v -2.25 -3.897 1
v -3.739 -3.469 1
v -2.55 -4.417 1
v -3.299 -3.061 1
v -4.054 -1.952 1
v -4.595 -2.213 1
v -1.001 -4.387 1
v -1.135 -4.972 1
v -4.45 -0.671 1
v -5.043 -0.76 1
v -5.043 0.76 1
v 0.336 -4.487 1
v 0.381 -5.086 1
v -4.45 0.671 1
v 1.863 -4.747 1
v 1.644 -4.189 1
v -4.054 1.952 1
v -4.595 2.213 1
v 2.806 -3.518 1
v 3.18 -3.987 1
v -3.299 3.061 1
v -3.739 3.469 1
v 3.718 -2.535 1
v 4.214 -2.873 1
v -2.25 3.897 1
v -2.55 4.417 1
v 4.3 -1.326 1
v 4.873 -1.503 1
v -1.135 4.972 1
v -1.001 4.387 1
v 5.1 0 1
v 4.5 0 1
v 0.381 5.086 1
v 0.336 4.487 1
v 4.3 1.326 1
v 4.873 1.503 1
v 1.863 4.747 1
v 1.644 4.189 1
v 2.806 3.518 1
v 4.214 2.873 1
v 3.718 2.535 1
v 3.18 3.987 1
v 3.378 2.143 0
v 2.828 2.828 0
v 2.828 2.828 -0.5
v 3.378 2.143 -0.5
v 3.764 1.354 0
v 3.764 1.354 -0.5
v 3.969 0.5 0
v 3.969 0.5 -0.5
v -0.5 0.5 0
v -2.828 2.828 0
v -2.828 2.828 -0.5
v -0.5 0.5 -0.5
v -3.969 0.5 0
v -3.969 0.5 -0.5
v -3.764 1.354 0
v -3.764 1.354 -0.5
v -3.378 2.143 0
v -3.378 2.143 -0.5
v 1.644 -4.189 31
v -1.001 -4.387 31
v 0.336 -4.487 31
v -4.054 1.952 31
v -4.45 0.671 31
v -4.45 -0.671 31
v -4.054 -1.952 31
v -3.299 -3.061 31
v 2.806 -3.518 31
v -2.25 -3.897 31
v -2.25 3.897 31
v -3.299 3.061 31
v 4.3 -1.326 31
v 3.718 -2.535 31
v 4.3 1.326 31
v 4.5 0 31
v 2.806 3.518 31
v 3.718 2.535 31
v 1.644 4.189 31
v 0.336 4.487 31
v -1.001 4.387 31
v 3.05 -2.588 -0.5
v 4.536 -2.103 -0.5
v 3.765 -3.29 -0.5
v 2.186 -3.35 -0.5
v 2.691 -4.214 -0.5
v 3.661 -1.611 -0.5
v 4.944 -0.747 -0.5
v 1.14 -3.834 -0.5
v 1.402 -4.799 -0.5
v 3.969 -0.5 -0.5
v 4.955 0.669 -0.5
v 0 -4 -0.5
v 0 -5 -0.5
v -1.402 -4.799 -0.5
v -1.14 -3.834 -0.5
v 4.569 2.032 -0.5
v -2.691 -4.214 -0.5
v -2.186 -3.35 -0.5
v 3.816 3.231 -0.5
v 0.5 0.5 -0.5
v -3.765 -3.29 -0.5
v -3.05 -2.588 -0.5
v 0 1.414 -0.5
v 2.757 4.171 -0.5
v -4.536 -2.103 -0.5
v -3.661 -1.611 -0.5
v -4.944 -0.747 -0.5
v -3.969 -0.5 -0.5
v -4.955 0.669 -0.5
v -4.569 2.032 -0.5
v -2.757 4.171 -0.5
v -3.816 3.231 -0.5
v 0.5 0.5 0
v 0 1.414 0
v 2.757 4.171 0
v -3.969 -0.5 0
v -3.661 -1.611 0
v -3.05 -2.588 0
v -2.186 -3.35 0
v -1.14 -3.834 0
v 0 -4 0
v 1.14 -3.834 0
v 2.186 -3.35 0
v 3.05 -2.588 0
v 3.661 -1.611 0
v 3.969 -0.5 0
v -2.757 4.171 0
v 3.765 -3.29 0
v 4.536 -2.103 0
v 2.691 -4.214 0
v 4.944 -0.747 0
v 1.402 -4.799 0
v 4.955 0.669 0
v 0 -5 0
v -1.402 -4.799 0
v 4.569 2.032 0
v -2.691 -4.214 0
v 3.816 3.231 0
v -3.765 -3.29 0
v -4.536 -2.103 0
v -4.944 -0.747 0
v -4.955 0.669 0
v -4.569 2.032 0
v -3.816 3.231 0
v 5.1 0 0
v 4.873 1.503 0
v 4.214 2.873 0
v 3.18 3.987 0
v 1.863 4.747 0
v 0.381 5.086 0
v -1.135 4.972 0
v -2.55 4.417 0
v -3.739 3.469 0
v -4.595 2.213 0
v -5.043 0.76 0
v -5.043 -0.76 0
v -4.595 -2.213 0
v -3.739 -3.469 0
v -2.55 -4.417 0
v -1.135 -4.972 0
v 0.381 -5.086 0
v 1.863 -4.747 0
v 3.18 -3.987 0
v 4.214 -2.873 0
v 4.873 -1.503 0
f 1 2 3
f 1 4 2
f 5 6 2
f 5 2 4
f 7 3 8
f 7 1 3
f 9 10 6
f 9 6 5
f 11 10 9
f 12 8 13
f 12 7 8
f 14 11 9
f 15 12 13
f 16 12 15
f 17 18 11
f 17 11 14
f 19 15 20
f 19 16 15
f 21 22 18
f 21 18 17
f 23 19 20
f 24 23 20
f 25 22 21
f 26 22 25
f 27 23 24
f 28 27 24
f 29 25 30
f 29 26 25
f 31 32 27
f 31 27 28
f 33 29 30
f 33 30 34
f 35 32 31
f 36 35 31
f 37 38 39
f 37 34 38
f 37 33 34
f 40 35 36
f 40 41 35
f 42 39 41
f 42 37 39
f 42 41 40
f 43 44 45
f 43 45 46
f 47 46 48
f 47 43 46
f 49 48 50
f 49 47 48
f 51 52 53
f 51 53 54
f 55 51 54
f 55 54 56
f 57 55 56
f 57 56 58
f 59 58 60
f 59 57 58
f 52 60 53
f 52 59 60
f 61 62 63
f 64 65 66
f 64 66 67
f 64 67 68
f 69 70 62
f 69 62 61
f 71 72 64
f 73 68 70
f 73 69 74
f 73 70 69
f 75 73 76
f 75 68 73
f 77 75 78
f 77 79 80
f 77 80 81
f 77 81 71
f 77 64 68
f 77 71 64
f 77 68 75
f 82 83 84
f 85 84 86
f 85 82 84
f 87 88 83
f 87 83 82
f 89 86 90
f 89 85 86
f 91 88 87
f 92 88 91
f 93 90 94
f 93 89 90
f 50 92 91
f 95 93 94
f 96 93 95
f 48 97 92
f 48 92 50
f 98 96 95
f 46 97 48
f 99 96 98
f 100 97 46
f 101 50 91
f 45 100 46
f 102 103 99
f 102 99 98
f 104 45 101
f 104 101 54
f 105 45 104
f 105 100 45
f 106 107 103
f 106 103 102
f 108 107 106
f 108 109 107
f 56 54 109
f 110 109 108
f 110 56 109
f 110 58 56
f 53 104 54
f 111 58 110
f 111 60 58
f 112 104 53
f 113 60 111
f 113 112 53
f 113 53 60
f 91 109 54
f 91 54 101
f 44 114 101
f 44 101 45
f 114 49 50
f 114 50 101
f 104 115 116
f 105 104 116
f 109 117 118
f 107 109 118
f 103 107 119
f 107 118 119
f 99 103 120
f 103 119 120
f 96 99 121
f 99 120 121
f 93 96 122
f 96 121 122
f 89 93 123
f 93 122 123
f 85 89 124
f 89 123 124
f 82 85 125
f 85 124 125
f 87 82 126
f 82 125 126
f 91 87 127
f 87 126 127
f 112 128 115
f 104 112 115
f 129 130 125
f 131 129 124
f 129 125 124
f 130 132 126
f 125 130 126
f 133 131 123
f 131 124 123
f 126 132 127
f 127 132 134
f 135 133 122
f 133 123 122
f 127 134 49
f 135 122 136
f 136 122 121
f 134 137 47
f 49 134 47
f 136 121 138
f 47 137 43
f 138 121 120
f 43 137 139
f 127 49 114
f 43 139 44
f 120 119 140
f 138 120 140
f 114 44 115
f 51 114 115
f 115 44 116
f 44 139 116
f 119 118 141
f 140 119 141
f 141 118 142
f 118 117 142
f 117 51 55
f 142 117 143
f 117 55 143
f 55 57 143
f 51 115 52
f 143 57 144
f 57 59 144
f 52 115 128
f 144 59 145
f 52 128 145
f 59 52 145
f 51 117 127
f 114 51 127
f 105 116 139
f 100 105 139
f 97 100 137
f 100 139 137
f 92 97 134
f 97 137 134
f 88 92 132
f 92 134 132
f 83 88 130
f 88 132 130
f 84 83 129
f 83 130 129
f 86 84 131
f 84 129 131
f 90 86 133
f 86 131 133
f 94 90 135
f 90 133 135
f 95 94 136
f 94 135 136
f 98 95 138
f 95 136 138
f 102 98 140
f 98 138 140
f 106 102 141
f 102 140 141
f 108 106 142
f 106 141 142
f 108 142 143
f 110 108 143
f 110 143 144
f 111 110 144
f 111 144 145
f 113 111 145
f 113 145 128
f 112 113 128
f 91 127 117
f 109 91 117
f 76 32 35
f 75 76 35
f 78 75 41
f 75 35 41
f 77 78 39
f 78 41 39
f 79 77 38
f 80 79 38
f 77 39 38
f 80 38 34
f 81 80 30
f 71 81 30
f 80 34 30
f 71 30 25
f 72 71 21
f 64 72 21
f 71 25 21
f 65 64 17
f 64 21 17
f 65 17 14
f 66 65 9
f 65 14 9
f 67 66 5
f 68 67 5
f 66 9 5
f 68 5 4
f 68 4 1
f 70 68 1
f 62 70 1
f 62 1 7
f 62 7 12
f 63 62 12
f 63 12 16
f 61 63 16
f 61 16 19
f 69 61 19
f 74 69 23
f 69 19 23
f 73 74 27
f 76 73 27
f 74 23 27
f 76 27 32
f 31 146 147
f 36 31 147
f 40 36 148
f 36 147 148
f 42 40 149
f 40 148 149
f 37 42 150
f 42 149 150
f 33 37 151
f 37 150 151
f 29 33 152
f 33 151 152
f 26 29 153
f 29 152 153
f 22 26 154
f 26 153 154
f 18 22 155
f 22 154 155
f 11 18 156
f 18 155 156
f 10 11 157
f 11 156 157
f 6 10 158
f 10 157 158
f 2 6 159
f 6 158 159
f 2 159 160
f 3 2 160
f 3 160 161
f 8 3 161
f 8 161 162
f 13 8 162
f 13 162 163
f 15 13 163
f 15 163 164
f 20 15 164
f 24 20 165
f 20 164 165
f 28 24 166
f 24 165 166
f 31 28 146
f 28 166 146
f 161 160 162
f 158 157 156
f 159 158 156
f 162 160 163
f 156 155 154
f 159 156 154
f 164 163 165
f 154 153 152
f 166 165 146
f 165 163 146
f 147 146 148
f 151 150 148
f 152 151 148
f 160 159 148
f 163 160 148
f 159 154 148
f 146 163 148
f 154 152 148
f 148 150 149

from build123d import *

# Parameters (mm, degrees)
SKETCH_1_R      = 5.1
EXTRUDE_1_DEPTH = 1
SKETCH_2_R      = 4.5
EXTRUDE_2_DEPTH = 30
EXTRUDE_3_DEPTH = 0.5


with BuildPart() as part:
    # Эскиз1 → Бобышка-Вытянуть1 (new body)
    with BuildSketch(Plane.XY):
        Circle(SKETCH_1_R)
    extrude(amount=EXTRUDE_1_DEPTH)

    # Эскиз2 → Бобышка-Вытянуть2 (add)
    with BuildSketch(Plane.XY.offset(1)):
        Circle(SKETCH_2_R)
    extrude(amount=EXTRUDE_2_DEPTH)


with BuildPart() as body_2:
    # Эскиз4 → Бобышка-Вытянуть3 (new body)
    with BuildSketch(Plane(origin=(0, 0, 0), x_dir=(-1, 0, 0), z_dir=(0, 0, -1))):
        with BuildLine():
            Line((2.756994834, 4.171208396), (0, 1.414213562))
            Line((0, 1.414213562), (-2.756994834, 4.171208396))
            ThreePointArc((-2.756994834, 4.171208396), (0, -5), (2.756994834, 4.171208396))
        make_face()
        with BuildLine():
            Line((-3.968626967, 0.5), (-0.5, 0.5))
            Line((-0.5, 0.5), (-2.828427125, 2.828427125))
            ThreePointArc((-2.828427125, 2.828427125), (-3.592405782, 1.759153405), (-3.968626967, 0.5))
        make_face(mode=Mode.SUBTRACT)
        with BuildLine():
            Line((-3.968626967, -0.5), (3.968626967, -0.5))
            ThreePointArc((3.968626967, -0.5), (0, -4), (-3.968626967, -0.5))
        make_face(mode=Mode.SUBTRACT)
        with BuildLine():
            Line((0.5, 0.5), (3.968626967, 0.5))
            ThreePointArc((3.968626967, 0.5), (3.592405782, 1.759153405), (2.828427125, 2.828427125))
            Line((2.828427125, 2.828427125), (0.5, 0.5))
        make_face(mode=Mode.SUBTRACT)
    extrude(amount=EXTRUDE_3_DEPTH)


solid = Compound([part.part, body_2.part])
